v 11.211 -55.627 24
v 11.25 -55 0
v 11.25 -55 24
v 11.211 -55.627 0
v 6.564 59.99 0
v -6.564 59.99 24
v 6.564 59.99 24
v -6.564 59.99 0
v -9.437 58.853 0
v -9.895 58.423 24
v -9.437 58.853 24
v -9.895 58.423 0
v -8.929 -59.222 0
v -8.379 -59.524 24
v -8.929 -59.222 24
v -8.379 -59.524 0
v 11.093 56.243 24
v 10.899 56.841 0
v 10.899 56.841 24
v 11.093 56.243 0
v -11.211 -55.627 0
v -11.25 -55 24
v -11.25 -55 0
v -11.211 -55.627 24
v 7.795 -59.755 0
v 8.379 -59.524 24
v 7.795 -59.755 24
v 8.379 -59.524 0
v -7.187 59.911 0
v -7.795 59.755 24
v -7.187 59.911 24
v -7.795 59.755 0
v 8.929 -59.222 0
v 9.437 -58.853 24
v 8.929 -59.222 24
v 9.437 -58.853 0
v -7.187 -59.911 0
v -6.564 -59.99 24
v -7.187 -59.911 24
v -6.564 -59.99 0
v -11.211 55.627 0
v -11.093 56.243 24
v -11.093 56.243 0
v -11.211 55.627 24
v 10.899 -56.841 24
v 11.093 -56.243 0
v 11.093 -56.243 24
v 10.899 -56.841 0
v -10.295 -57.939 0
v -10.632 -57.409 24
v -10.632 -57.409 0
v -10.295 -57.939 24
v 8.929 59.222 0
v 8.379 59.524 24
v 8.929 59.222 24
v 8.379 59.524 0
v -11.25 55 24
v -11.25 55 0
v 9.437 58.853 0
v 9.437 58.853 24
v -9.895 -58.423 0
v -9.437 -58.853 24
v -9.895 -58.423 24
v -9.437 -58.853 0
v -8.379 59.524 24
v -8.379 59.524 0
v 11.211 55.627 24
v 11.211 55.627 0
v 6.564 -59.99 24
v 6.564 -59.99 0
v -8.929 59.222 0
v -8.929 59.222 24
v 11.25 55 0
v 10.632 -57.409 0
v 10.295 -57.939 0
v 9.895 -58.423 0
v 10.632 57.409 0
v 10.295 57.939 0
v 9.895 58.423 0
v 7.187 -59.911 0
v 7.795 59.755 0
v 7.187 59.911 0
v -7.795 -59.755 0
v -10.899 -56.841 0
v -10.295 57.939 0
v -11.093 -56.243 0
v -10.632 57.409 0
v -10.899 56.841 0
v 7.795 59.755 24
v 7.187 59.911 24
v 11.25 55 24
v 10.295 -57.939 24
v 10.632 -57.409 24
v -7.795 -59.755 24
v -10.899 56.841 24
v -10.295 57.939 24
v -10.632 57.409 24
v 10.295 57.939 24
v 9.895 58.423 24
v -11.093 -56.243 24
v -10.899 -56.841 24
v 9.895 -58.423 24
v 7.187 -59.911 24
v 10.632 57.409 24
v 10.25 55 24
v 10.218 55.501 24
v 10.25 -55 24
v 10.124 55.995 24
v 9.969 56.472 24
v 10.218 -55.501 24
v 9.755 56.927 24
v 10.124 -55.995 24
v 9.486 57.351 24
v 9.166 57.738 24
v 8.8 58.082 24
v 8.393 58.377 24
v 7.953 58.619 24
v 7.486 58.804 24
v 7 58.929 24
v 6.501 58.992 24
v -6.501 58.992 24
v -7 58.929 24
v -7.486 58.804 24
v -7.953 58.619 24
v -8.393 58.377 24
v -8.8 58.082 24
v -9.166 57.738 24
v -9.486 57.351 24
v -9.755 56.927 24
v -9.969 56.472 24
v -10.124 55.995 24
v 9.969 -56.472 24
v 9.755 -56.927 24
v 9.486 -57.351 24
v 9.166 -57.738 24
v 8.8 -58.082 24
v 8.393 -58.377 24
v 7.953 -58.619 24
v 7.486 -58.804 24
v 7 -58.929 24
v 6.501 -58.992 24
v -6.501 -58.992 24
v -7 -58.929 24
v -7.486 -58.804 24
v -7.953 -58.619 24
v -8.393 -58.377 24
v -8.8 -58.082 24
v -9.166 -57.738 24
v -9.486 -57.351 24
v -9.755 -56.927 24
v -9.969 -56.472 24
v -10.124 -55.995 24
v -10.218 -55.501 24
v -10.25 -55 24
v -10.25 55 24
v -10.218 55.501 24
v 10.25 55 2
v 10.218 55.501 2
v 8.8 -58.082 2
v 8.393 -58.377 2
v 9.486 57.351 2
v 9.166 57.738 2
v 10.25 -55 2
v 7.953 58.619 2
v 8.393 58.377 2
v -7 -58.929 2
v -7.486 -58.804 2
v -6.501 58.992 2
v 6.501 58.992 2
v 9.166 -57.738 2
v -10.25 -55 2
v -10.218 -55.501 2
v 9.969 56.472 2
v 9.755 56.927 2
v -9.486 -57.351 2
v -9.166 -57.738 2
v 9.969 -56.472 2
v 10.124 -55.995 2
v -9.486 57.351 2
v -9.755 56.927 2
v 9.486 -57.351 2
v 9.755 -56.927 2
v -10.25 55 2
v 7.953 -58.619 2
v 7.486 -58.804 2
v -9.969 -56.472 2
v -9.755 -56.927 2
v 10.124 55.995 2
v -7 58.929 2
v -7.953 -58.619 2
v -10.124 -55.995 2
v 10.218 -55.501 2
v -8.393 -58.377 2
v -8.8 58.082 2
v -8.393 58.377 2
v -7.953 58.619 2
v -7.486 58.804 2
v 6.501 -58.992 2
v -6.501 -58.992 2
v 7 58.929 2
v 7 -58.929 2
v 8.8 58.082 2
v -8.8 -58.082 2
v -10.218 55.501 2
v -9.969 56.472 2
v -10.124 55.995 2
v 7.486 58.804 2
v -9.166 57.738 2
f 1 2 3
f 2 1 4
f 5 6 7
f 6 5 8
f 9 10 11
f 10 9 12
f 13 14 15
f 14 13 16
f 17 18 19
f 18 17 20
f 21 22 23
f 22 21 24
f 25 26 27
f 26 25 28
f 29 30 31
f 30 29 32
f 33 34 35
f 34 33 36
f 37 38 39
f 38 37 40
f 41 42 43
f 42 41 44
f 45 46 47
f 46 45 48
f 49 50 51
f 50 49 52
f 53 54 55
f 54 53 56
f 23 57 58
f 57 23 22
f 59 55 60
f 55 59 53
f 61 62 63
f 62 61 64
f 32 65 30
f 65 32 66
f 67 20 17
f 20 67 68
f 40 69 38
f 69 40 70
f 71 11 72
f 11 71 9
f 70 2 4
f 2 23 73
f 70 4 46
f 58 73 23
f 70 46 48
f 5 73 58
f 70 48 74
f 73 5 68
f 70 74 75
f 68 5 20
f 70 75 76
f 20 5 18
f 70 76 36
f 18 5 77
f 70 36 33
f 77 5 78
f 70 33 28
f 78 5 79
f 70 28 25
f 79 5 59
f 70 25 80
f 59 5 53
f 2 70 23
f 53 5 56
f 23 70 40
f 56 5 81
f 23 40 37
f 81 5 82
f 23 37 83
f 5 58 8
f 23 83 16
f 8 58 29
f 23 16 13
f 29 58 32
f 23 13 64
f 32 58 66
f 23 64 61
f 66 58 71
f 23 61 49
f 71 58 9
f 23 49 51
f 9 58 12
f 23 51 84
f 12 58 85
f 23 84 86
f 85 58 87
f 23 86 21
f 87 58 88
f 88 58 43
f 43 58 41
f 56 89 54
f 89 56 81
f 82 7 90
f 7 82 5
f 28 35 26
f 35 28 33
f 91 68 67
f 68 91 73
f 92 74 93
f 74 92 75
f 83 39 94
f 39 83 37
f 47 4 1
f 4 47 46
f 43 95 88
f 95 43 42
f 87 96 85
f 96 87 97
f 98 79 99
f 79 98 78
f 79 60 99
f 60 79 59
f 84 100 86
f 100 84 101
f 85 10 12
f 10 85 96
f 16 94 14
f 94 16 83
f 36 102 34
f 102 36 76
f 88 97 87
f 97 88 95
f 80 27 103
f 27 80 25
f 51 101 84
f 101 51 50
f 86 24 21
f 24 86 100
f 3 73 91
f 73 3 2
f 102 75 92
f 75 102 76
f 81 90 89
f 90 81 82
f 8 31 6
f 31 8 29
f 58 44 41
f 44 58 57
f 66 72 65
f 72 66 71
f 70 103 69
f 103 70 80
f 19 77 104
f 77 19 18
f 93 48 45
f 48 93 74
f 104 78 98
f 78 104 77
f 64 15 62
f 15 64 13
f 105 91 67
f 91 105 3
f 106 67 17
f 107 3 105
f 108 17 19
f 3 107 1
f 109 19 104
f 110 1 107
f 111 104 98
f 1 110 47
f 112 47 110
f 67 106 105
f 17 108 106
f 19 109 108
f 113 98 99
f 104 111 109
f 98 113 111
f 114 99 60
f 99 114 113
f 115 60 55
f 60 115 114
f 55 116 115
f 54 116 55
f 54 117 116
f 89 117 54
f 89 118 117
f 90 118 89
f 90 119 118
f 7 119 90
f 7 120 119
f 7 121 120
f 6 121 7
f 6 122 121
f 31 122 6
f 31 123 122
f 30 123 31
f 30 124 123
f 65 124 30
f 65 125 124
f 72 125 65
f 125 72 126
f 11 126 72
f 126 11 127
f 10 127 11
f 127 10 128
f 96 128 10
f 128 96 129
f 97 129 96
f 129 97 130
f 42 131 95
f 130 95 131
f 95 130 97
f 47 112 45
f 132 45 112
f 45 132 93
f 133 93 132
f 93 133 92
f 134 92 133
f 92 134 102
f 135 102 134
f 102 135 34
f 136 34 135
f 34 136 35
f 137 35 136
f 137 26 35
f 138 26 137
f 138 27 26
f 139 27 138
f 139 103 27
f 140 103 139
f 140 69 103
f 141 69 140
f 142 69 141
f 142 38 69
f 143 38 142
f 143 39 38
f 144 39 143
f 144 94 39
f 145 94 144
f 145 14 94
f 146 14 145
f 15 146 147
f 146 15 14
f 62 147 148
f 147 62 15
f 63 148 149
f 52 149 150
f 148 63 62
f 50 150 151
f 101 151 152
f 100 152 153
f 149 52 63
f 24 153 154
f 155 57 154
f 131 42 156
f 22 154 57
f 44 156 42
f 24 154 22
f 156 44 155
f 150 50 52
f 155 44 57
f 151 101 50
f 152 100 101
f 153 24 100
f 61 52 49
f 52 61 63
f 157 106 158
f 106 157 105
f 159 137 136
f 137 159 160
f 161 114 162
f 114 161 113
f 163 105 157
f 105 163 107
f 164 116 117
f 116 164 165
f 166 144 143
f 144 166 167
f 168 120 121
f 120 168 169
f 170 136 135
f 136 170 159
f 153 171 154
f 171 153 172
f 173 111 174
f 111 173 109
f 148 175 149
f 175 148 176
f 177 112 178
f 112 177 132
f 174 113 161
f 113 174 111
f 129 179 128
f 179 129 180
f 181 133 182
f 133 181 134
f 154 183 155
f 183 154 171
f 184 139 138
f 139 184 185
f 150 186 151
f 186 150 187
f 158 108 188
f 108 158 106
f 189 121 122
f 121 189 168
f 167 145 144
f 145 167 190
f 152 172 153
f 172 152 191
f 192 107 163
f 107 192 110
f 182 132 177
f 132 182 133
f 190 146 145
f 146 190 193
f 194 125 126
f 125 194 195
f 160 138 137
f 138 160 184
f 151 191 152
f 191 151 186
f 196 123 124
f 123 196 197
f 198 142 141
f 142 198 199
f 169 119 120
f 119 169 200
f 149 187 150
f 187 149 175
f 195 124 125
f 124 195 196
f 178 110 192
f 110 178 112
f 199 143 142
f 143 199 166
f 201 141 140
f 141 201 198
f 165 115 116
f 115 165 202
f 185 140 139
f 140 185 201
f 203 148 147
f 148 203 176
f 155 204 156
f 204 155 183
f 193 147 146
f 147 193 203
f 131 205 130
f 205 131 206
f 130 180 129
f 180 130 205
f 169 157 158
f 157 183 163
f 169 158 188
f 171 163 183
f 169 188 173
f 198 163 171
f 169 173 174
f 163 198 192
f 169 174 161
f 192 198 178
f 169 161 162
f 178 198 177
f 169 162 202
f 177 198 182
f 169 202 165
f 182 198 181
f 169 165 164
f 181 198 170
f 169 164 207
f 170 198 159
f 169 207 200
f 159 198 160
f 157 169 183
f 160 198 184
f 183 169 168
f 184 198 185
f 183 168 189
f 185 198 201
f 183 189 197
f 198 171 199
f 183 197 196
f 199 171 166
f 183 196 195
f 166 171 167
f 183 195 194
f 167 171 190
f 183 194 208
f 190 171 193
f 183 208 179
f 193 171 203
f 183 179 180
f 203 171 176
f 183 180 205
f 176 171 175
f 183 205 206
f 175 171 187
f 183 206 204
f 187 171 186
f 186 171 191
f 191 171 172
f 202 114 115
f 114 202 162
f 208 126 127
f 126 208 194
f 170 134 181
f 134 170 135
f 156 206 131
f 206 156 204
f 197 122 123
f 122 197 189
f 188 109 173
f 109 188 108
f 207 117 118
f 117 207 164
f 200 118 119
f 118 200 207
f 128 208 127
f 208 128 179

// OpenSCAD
$fn = 50;


difference() {
	union() {
		hull() {
			translate(v = [-6.2500000000, 55.0000000000, 0]) {
				cylinder(h = 24, r = 5);
			}
			translate(v = [6.2500000000, 55.0000000000, 0]) {
				cylinder(h = 24, r = 5);
			}
			translate(v = [-6.2500000000, -55.0000000000, 0]) {
				cylinder(h = 24, r = 5);
			}
			translate(v = [6.2500000000, -55.0000000000, 0]) {
				cylinder(h = 24, r = 5);
			}
		}
	}
	union() {
		translate(v = [0, 0, 2]) {
			hull() {
				translate(v = [-6.2500000000, 55.0000000000, 0]) {
					cylinder(h = 22, r = 4);
				}
				translate(v = [6.2500000000, 55.0000000000, 0]) {
					cylinder(h = 22, r = 4);
				}
				translate(v = [-6.2500000000, -55.0000000000, 0]) {
					cylinder(h = 22, r = 4);
				}
				translate(v = [6.2500000000, -55.0000000000, 0]) {
					cylinder(h = 22, r = 4);
				}
			}
		}
	}
}
